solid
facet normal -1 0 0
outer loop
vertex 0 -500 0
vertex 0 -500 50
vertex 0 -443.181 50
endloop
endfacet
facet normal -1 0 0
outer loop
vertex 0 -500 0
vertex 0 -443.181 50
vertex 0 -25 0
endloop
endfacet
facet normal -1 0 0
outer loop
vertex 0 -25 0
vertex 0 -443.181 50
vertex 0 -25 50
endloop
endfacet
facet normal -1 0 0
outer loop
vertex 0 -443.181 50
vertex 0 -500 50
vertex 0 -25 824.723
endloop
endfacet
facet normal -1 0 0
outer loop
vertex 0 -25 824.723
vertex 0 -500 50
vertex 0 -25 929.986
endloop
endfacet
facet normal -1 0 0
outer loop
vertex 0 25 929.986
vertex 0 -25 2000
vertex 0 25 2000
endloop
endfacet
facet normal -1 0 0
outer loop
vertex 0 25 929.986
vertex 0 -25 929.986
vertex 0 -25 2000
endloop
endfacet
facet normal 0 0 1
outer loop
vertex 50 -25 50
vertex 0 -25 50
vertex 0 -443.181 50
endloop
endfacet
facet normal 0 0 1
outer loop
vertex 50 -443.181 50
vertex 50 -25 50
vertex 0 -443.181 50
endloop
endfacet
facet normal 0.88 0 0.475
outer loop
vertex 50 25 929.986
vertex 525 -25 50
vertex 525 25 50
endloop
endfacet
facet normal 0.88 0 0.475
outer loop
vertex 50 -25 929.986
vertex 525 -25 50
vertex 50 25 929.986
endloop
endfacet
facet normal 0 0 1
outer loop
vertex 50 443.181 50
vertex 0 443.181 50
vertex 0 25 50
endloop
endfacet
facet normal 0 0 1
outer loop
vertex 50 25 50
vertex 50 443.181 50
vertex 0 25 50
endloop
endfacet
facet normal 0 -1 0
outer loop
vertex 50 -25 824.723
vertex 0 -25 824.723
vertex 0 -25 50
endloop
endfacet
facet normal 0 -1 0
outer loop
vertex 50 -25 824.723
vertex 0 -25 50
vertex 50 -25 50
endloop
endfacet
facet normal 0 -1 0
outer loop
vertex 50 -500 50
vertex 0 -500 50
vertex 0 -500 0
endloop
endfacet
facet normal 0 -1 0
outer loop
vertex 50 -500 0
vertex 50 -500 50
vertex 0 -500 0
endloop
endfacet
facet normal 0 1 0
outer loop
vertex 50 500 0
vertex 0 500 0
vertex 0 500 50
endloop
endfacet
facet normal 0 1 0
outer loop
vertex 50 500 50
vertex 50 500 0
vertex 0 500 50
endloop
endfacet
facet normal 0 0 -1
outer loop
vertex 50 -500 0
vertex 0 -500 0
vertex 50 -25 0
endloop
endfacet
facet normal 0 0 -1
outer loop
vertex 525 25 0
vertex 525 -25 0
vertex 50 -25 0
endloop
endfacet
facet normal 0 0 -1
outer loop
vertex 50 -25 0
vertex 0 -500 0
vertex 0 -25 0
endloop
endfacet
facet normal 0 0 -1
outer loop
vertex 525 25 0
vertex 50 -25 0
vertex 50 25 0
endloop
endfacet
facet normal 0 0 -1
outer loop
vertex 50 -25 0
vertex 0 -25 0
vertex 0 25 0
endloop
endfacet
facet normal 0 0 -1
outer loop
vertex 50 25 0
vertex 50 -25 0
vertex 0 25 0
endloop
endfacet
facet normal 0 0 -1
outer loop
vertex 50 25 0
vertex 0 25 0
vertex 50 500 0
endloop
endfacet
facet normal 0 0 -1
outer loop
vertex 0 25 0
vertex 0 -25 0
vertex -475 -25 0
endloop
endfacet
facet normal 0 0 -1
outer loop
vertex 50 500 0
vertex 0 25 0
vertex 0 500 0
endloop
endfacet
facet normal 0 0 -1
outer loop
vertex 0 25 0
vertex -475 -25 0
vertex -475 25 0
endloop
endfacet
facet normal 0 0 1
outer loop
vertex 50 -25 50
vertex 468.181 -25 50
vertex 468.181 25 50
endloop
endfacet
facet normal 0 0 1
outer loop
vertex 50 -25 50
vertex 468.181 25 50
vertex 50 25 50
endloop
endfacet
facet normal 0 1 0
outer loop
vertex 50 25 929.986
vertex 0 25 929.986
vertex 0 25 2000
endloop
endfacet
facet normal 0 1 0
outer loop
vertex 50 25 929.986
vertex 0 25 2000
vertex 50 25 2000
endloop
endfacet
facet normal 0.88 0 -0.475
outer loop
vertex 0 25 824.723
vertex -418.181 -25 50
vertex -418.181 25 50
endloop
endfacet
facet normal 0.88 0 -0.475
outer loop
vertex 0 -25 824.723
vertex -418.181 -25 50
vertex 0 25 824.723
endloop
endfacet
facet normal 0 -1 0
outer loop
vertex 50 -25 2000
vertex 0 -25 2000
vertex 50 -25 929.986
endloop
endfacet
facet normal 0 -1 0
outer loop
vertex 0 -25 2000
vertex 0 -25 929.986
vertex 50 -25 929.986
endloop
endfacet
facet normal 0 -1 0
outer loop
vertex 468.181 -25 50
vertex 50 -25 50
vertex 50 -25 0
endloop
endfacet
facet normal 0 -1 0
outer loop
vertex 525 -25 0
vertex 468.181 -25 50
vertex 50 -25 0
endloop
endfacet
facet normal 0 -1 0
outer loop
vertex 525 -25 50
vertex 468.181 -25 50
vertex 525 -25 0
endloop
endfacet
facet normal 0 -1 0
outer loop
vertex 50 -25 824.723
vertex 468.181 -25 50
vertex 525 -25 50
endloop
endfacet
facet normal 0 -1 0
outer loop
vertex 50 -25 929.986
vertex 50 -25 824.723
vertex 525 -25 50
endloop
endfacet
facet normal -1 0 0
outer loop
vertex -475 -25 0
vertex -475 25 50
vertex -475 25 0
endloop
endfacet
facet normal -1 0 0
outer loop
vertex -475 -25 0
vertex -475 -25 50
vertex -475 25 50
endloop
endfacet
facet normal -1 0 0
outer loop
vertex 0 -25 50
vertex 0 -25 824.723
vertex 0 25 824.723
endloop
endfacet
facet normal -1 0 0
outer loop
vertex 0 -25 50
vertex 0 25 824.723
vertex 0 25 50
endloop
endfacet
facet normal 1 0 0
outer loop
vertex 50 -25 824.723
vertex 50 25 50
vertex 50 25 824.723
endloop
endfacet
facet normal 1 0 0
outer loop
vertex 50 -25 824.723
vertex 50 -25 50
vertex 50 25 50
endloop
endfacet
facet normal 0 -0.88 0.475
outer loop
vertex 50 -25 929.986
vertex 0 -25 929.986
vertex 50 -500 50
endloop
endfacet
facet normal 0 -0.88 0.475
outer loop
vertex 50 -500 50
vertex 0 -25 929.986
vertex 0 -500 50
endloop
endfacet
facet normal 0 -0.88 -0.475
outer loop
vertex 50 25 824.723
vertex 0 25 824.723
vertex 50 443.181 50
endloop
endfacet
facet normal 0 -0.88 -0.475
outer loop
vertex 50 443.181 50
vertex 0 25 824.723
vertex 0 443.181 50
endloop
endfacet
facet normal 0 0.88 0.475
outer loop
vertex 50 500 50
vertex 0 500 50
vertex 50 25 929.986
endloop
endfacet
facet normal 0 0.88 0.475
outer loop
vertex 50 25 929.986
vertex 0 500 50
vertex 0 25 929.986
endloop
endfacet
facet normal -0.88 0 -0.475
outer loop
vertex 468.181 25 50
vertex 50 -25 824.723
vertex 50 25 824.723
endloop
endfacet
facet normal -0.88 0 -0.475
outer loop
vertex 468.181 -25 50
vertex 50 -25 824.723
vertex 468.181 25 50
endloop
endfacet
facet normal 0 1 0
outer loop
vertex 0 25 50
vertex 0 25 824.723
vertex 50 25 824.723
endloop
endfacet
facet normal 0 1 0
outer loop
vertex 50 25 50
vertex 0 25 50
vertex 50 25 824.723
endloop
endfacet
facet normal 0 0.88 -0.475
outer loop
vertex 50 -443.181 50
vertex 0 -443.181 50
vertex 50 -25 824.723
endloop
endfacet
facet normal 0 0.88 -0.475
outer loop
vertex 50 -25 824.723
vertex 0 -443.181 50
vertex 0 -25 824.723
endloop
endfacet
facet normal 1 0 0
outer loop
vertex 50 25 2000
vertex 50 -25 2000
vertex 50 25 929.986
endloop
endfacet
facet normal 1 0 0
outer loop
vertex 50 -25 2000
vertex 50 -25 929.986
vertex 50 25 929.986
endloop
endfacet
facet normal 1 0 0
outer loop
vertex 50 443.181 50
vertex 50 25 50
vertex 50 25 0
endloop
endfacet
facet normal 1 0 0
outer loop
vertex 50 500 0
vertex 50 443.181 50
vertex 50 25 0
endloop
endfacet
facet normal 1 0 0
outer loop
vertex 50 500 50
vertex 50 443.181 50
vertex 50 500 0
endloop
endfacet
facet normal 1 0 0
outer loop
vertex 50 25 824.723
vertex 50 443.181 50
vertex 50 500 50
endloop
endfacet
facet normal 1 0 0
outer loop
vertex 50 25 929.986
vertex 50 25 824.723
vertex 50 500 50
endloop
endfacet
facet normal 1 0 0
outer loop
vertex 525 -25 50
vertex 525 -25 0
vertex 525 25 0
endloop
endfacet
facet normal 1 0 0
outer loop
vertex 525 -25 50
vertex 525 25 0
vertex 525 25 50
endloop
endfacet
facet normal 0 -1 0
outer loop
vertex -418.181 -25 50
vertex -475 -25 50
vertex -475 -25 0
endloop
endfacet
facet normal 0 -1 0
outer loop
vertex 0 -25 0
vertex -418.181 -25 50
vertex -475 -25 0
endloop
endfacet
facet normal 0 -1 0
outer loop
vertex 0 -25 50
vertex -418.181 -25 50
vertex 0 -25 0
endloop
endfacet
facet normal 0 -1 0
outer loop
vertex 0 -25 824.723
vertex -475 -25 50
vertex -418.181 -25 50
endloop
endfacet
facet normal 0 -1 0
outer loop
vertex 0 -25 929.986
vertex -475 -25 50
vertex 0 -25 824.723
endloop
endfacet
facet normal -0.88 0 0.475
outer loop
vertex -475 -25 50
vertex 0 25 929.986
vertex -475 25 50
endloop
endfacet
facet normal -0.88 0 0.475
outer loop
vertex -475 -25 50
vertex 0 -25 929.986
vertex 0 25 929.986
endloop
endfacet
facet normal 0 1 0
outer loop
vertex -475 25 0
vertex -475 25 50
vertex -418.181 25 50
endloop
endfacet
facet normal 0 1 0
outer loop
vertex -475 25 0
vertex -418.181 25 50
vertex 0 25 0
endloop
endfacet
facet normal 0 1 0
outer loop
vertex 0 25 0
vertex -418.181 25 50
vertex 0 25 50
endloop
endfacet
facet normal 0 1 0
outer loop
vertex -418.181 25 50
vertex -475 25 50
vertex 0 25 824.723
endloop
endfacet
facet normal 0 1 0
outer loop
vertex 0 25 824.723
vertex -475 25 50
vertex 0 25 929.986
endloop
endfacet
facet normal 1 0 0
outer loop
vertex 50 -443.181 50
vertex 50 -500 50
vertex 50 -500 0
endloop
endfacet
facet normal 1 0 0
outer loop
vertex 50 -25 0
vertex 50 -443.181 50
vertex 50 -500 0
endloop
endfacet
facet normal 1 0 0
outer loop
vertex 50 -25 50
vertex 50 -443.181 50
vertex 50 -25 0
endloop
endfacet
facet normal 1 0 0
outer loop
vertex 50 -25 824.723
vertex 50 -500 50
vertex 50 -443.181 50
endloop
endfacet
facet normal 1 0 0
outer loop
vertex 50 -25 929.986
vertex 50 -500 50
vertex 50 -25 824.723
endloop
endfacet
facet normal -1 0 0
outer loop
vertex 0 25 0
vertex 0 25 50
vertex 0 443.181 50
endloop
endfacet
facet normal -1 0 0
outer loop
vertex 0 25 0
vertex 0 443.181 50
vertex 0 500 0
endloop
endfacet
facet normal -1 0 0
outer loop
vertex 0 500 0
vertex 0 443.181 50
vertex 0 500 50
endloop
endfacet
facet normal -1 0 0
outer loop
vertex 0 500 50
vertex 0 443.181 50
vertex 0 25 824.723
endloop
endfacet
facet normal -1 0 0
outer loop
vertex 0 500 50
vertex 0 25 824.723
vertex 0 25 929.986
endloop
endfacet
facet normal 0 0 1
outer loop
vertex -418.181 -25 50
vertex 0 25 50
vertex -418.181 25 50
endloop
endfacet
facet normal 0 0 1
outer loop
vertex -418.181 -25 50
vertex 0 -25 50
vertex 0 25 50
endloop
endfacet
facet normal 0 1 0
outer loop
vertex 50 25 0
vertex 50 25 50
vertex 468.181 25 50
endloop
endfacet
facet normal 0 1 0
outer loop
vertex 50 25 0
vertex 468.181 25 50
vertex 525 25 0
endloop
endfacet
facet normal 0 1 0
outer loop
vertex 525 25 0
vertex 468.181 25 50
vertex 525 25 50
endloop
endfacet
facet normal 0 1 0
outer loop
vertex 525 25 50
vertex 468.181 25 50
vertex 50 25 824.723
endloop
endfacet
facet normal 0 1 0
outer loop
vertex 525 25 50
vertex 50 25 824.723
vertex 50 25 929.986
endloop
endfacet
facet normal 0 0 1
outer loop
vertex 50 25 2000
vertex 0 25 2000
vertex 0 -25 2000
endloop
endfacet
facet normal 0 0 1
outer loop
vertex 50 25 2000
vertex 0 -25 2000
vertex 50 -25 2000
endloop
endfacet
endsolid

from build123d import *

# Parameters (mm, degrees)
F1_DEPTH  = 25
F3_DEPTH  = 50
F1_FACE_W = 50
F1_FACE_H = 50
F4_DEPTH  = 1000


with BuildPart() as f1:
    # F0 (on Front) → F1 (new body, symmetric)
    with BuildSketch(Plane.XZ):
        Polygon((-475, 0), (0, 0), (50, 0), (525, 0), (525, 50), (50, 929.985795), (50, 1000), (0, 1000), (0, 929.985795), (-475, 50), align=None)
        Polygon((0, 824.722637), (0, 50), (-418.180901, 50), align=None, mode=Mode.SUBTRACT)
        Polygon((468.180901, 50), (50, 50), (50, 824.722637), align=None, mode=Mode.SUBTRACT)
    extrude(amount=F1_DEPTH, both=True)

    # F2 (on Right) → F3 (join)
    with BuildSketch(Plane.YZ):
        Polygon((-500, 50), (-500, 0), (500, 0), (500, 50), (25, 929.985795), (-25, 929.985795), align=None)
        Polygon((-25, 50), (-443.180901, 50), (-25, 824.722637), align=None, mode=Mode.SUBTRACT)
        Polygon((25, 50), (25, 824.722637), (443.180901, 50), align=None, mode=Mode.SUBTRACT)
    extrude(amount=F3_DEPTH)

    # F1_face (on face) → F4 (join)
    with BuildSketch(Plane(origin=(25, 0, 1000), x_dir=(1, 0, 0), z_dir=(0, 0, 1))):
        Rectangle(F1_FACE_W, F1_FACE_H)
    extrude(amount=F4_DEPTH)


solid = f1.part
